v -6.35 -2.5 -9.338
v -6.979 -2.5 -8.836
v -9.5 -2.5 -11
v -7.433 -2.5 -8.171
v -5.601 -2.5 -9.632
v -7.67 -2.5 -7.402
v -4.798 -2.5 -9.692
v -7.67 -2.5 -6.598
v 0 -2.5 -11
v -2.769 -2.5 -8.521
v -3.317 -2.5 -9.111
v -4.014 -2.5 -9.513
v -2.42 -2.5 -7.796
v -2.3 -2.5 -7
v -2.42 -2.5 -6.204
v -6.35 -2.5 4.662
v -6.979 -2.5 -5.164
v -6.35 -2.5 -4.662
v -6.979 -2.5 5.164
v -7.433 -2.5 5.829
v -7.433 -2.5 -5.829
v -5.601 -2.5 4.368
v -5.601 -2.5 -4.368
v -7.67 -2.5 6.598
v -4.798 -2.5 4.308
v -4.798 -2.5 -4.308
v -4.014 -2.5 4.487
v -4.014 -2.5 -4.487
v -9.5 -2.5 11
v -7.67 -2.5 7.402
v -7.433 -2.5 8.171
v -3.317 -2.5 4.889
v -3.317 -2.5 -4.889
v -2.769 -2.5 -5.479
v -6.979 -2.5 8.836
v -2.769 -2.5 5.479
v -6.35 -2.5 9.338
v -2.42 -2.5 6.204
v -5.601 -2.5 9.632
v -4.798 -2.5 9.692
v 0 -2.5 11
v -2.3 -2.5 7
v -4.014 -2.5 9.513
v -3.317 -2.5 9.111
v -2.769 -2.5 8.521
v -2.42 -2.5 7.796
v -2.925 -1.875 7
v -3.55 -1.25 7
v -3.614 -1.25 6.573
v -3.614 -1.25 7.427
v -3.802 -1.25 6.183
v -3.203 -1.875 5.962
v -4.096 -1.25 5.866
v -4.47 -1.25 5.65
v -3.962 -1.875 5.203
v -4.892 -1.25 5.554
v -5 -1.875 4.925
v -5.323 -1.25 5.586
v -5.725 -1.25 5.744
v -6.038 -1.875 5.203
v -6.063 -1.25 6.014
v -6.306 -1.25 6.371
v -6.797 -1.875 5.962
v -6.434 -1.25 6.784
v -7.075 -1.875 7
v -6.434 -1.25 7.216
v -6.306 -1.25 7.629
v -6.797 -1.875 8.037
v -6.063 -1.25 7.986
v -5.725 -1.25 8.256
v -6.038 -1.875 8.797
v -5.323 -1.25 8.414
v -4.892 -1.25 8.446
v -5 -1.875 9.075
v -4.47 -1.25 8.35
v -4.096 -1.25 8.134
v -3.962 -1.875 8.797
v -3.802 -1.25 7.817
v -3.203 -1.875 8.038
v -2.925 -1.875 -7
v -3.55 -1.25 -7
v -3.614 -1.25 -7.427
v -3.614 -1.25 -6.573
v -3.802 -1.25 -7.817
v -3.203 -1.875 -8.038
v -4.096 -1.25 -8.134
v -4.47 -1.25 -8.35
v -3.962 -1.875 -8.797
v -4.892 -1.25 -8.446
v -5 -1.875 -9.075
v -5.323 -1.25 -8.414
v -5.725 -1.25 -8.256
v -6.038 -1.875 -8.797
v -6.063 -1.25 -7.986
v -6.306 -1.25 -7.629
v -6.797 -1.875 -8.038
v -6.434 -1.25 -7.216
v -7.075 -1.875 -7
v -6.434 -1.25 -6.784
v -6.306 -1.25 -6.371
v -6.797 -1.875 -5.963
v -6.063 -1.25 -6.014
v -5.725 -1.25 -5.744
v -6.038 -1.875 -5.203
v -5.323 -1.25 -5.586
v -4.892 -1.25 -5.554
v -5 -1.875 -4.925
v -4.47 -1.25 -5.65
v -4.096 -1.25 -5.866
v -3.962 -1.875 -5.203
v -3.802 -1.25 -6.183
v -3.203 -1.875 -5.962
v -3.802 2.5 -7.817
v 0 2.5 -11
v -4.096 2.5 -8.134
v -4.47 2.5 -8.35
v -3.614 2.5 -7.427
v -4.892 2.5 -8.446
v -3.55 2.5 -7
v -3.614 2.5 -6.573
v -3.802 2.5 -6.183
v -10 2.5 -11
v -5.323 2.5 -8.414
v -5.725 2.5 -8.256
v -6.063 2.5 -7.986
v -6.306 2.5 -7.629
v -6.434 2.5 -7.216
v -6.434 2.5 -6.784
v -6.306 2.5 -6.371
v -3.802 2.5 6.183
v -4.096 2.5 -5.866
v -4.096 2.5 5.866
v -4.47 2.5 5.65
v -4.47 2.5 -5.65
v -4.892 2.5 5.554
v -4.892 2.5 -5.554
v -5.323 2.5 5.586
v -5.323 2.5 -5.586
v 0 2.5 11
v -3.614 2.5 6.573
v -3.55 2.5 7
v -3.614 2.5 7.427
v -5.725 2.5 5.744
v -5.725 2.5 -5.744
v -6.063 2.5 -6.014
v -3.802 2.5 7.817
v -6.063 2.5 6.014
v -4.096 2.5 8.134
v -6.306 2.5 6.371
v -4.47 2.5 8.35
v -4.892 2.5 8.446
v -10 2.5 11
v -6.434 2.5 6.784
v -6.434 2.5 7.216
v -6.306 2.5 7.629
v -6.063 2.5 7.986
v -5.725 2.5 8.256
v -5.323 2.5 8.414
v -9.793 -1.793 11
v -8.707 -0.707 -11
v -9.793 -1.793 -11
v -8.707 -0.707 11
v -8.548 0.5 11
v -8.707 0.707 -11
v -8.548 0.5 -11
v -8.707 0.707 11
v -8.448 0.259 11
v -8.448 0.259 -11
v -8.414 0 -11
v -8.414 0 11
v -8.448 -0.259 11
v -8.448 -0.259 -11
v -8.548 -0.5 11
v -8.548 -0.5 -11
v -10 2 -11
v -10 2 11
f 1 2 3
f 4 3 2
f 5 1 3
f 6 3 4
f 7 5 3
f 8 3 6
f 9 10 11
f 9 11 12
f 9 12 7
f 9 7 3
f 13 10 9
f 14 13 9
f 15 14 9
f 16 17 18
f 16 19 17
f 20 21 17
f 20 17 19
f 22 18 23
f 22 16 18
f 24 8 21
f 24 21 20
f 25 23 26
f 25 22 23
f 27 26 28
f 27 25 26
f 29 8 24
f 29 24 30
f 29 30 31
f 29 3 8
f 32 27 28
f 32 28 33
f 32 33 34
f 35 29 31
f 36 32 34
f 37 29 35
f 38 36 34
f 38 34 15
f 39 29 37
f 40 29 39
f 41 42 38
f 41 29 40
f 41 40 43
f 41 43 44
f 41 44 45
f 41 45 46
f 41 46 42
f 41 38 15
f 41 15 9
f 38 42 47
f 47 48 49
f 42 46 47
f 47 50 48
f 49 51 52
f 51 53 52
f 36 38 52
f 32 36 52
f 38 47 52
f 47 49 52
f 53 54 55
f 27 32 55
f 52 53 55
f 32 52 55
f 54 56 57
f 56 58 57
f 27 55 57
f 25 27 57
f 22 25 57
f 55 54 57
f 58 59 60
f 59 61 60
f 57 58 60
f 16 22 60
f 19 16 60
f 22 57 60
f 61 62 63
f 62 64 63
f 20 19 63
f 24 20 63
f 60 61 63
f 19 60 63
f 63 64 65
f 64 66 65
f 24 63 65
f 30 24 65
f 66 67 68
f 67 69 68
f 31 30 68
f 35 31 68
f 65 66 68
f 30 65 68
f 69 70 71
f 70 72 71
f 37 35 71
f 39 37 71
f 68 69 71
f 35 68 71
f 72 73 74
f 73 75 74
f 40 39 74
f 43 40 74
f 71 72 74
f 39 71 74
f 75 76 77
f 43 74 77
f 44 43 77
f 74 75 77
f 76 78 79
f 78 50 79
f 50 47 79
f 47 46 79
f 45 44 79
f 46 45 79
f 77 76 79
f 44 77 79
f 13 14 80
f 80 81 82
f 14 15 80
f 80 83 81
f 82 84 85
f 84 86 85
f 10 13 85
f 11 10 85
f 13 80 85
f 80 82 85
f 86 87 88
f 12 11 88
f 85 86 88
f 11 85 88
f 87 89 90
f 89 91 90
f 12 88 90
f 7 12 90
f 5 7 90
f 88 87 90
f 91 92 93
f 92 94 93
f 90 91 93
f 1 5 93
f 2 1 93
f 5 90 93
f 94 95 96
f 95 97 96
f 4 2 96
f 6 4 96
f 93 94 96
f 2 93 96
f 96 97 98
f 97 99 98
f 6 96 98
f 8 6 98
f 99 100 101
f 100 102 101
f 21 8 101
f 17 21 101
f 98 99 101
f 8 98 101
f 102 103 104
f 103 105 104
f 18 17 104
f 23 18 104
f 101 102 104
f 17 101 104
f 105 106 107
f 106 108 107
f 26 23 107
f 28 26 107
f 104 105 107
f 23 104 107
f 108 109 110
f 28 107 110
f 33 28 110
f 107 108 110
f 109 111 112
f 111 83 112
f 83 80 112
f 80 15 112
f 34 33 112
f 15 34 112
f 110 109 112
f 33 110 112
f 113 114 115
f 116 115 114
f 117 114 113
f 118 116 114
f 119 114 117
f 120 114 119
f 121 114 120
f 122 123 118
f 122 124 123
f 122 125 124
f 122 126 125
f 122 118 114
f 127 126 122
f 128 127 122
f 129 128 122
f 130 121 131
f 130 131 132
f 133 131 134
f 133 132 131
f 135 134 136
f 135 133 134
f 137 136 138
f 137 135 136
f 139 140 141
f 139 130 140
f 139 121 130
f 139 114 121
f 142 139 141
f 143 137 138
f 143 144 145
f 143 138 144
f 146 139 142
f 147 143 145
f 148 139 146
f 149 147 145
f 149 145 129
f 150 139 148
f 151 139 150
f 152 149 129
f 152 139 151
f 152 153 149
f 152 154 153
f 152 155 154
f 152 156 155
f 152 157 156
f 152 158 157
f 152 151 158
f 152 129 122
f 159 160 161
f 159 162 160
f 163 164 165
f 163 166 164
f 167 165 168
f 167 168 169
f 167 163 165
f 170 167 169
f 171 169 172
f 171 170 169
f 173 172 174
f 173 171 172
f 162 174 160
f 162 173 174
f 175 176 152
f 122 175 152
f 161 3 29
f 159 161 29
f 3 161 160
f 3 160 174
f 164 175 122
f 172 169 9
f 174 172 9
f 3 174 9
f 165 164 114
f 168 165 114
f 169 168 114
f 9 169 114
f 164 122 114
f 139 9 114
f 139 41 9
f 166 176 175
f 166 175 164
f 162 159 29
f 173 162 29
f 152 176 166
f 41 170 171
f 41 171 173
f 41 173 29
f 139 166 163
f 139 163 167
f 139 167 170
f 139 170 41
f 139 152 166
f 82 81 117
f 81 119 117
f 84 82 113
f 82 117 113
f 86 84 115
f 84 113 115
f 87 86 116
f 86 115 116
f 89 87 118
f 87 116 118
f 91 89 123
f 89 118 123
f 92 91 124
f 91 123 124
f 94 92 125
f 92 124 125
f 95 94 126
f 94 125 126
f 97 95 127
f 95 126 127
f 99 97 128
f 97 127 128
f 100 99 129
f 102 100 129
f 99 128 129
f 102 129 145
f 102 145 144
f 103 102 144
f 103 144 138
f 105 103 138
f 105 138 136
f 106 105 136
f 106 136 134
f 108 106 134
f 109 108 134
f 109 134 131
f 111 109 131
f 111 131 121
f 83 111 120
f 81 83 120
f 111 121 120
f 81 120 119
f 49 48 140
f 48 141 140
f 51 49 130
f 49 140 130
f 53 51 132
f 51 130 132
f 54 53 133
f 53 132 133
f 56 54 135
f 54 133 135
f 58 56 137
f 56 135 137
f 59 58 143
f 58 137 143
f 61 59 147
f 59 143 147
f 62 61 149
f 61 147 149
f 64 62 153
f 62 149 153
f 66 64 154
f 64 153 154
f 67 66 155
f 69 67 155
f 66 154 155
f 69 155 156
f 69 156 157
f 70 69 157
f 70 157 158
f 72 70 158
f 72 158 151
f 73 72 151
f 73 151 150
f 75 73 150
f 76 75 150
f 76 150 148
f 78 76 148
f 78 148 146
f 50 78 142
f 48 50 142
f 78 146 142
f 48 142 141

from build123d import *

# Parameters (mm, degrees)
BOSS_EXTRUDE1_DEPTH                                 = 11
FILLET1_R                                           = 1
CHAMFER1_SIZE                                       = 1
CUT_EXTRUDE1_DEPTH                                  = 25.50510151
CSK_FOR_M2_5_CROSS_RECESSED_RAISED_CTSK_D           = 2.9
CSK_FOR_M2_5_CROSS_RECESSED_RAISED_CTSK_CSINK_D     = 5.4
CSK_FOR_M2_5_CROSS_RECESSED_RAISED_CTSK_CSINK_ANGLE = 90


with BuildPart() as part:
    # Sketch1 → Boss-Extrude1 (new, symmetric)
    with BuildSketch(Plane.XY):
        Polygon((-10.5, 2.5), (-8, 0), (-10.5, -2.5), (0, -2.5), (0, 2.5), align=None)
    extrude(amount=BOSS_EXTRUDE1_DEPTH, both=True)

    # Fillet1
    fillet1_edges = [part.edges().sort_by_distance(p)[0] for p in [
        (-8, 0, 0),
    ]]
    fillet(fillet1_edges, radius=FILLET1_R)

    # Chamfer1
    chamfer1_edges = [part.edges().sort_by_distance(p)[0] for p in [
        (-10.5, -2.5, 0),
    ]]
    chamfer(chamfer1_edges, length=CHAMFER1_SIZE)

    # Sketch2 → Cut-Extrude1 (cut, through all)
    with BuildSketch(Plane.XY.offset(11)):
        Polygon((-10.5, 2.5), (-10, 2), (-10, 2.5), align=None)
    extrude(amount=-CUT_EXTRUDE1_DEPTH, mode=Mode.SUBTRACT)

    # CSK for M2.5 Cross recessed raised CTSK head wood screws1 (through all)
    with Locations(Plane(origin=(-5, -2.5, 7), x_dir=(-1, 0, 0), z_dir=(0, -1, 0))):
        with Locations((0, 0), (0, 14)):
            CounterSinkHole(CSK_FOR_M2_5_CROSS_RECESSED_RAISED_CTSK_D / 2, CSK_FOR_M2_5_CROSS_RECESSED_RAISED_CTSK_CSINK_D / 2, counter_sink_angle=CSK_FOR_M2_5_CROSS_RECESSED_RAISED_CTSK_CSINK_ANGLE)


solid = part.part
